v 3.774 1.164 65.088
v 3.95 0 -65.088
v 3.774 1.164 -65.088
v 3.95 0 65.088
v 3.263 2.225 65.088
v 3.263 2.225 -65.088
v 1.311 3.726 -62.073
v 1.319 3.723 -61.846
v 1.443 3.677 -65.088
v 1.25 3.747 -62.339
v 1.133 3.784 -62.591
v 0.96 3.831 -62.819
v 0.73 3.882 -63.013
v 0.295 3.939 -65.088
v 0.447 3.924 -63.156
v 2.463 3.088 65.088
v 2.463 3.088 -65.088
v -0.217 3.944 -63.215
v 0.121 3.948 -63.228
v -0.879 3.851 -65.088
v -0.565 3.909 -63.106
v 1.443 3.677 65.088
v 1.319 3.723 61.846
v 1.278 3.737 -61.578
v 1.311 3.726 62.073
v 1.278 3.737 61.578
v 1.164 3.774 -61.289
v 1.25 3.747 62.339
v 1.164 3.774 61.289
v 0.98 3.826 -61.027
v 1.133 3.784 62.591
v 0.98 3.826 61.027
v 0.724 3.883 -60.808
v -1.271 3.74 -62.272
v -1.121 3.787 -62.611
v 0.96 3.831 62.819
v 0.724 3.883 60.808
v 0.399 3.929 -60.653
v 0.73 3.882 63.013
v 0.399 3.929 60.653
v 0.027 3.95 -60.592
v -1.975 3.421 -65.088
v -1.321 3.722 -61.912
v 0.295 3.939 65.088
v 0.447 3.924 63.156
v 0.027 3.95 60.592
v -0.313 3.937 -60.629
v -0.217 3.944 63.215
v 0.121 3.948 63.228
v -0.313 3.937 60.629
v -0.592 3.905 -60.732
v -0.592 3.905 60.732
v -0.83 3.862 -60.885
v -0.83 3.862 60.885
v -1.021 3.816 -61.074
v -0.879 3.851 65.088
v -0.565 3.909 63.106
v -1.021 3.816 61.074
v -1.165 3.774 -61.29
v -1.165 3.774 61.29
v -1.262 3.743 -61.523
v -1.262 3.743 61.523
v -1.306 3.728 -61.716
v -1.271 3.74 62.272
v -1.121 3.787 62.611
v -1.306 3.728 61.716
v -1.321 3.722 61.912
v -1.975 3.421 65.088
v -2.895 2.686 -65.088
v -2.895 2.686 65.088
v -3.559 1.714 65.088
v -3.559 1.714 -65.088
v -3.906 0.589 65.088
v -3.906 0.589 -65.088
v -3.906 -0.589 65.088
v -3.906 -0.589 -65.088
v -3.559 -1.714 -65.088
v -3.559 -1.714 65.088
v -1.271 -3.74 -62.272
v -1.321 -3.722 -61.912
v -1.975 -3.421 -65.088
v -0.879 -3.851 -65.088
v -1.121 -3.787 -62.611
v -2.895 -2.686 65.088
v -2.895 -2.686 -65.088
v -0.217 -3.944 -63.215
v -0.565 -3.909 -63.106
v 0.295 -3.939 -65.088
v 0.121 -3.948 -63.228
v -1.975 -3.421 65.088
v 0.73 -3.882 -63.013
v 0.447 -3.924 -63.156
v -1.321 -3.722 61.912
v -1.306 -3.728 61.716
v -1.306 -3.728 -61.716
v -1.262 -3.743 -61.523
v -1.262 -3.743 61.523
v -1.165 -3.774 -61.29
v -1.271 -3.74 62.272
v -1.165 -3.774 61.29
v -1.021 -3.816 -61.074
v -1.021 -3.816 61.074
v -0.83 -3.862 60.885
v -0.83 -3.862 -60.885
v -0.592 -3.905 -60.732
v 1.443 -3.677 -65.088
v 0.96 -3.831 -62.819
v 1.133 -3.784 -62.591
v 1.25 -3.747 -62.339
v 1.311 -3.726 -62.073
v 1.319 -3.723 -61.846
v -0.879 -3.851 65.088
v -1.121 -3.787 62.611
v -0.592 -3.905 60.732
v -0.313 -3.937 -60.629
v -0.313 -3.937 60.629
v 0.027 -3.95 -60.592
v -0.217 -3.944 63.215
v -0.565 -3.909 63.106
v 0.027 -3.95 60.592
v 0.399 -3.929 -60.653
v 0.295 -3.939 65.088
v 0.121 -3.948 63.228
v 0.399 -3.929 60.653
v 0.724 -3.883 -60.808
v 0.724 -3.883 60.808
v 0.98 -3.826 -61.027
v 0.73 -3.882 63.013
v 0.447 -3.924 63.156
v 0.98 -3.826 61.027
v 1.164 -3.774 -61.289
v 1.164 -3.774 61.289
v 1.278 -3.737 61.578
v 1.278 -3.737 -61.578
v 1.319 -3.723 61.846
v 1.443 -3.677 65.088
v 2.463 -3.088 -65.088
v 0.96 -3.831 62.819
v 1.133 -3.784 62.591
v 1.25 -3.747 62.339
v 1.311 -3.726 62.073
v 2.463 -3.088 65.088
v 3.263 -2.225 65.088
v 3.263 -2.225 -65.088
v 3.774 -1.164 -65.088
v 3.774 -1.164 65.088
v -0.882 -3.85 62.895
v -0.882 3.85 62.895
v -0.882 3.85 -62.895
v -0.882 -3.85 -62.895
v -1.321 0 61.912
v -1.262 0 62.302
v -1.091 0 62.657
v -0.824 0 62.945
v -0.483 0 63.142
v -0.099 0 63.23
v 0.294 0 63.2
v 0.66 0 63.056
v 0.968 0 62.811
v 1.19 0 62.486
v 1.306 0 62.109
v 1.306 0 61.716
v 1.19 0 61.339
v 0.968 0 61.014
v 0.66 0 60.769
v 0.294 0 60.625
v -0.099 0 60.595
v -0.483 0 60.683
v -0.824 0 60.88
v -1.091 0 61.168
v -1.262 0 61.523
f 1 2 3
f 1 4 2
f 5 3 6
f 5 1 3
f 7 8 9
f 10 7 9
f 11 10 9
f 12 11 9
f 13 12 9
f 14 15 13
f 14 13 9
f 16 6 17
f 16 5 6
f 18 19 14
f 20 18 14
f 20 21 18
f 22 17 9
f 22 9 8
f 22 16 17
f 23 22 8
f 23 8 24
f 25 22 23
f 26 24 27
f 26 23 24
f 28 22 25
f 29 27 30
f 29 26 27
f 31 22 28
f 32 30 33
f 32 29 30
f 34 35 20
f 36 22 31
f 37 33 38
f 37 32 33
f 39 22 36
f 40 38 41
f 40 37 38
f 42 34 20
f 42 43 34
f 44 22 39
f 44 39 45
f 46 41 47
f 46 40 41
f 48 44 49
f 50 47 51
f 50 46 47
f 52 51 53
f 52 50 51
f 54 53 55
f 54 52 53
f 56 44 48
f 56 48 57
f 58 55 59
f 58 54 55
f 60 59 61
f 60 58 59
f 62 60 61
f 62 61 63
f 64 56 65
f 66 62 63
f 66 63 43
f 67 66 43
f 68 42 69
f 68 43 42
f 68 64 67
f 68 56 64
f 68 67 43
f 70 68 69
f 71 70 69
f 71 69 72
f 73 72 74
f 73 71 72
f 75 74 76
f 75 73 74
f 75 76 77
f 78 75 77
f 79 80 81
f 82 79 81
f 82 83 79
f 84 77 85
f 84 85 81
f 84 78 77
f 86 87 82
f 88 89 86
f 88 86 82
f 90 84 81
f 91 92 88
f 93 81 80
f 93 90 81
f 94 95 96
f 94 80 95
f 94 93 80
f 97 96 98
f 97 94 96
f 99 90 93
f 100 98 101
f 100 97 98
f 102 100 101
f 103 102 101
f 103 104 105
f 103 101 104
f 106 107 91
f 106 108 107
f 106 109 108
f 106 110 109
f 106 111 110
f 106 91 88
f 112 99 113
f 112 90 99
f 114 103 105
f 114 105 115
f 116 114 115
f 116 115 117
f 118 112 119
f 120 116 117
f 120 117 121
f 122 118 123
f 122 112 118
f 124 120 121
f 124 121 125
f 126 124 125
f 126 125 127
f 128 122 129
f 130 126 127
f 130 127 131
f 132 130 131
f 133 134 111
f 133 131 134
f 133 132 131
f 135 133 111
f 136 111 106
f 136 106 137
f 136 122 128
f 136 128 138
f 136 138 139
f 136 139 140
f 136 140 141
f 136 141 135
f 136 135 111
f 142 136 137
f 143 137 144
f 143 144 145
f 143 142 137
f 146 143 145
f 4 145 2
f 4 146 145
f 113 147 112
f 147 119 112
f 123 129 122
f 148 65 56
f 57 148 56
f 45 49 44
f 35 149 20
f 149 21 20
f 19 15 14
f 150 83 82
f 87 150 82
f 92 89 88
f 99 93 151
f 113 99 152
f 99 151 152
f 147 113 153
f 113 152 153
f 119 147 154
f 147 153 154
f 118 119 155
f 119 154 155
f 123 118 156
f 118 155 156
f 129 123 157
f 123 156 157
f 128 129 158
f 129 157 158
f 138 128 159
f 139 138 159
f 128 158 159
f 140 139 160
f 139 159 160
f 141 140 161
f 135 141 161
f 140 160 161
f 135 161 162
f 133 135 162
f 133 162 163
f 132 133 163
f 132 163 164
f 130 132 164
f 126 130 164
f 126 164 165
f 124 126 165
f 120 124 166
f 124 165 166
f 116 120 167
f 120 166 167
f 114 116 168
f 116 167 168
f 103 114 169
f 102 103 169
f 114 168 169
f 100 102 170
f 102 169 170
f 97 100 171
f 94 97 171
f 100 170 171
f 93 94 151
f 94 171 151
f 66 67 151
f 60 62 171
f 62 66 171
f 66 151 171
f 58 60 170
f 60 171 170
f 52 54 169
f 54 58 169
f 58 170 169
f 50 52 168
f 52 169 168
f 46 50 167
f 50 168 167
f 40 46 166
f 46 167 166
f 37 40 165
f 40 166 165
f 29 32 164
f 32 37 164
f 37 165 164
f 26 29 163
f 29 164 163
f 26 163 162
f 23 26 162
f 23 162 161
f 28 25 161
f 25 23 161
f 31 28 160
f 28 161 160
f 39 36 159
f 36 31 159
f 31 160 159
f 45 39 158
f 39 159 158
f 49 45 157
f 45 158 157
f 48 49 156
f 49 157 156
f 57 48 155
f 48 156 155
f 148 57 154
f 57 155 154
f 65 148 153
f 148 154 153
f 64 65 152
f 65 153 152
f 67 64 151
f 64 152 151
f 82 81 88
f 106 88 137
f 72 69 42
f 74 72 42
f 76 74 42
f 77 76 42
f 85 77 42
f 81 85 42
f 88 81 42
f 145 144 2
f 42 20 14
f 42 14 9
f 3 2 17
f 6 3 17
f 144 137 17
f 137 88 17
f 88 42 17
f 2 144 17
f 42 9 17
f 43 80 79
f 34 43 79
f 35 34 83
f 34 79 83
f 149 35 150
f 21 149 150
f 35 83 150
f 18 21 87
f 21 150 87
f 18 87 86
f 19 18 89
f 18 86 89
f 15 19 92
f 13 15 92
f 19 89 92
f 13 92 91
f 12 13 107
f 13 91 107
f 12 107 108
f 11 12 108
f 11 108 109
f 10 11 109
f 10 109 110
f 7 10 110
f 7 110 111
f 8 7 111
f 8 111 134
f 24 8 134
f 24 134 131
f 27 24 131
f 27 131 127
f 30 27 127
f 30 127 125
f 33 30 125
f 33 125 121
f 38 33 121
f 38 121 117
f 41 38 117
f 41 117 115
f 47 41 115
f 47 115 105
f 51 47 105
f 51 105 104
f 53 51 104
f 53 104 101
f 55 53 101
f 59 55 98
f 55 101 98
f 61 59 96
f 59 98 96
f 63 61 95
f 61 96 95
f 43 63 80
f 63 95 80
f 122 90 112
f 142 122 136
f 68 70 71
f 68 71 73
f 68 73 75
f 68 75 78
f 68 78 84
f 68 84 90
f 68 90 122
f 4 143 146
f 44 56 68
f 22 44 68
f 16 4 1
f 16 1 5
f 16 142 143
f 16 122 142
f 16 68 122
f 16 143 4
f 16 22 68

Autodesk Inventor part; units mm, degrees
ref_plane "YZ Plane" through (0, 0, 0) normal (1, 0, 0) x (0, 1, 0)
ref_plane "XZ Plane" through (0, 0, 0) normal (0, 1, 0) x (-1, 0, 0)
ref_plane "XY Plane" through (0, 0, 0) normal (0, 0, 1) x (1, 0, 0)
sketch "Sketch1" plane through (0, 0, 0) normal (0, 0, 1) x (1, 0, 0)
  circle A0 centre (0, 0) radius 3.9497
  dimension "d0" = 7.8994
extrude "Extrusion1" add sketch "Sketch1" against normal mid plane 130.175
sketch "Sketch2" plane through (0, 0, 0) normal (0, 1, 0) x (-1, 0, 0)
  circle A0 centre (0, 61.9125) radius 1.3208
  line L0 (-3.9497, 65.0875) -> (3.9497, 65.0875) projected
  point P0 (0, 65.0875)
  dimension "d3" = 2.6416
  dimension "d4" = 3.175
extrude "Extrusion2" cut sketch "Sketch2" along normal through all both and the other way through all
mirror "Mirror1" about plane through (0, 0, 0) normal (0, 0, 1) of "Extrusion2"
properties part number "Handle_Rod" material "Steel, Mild"
